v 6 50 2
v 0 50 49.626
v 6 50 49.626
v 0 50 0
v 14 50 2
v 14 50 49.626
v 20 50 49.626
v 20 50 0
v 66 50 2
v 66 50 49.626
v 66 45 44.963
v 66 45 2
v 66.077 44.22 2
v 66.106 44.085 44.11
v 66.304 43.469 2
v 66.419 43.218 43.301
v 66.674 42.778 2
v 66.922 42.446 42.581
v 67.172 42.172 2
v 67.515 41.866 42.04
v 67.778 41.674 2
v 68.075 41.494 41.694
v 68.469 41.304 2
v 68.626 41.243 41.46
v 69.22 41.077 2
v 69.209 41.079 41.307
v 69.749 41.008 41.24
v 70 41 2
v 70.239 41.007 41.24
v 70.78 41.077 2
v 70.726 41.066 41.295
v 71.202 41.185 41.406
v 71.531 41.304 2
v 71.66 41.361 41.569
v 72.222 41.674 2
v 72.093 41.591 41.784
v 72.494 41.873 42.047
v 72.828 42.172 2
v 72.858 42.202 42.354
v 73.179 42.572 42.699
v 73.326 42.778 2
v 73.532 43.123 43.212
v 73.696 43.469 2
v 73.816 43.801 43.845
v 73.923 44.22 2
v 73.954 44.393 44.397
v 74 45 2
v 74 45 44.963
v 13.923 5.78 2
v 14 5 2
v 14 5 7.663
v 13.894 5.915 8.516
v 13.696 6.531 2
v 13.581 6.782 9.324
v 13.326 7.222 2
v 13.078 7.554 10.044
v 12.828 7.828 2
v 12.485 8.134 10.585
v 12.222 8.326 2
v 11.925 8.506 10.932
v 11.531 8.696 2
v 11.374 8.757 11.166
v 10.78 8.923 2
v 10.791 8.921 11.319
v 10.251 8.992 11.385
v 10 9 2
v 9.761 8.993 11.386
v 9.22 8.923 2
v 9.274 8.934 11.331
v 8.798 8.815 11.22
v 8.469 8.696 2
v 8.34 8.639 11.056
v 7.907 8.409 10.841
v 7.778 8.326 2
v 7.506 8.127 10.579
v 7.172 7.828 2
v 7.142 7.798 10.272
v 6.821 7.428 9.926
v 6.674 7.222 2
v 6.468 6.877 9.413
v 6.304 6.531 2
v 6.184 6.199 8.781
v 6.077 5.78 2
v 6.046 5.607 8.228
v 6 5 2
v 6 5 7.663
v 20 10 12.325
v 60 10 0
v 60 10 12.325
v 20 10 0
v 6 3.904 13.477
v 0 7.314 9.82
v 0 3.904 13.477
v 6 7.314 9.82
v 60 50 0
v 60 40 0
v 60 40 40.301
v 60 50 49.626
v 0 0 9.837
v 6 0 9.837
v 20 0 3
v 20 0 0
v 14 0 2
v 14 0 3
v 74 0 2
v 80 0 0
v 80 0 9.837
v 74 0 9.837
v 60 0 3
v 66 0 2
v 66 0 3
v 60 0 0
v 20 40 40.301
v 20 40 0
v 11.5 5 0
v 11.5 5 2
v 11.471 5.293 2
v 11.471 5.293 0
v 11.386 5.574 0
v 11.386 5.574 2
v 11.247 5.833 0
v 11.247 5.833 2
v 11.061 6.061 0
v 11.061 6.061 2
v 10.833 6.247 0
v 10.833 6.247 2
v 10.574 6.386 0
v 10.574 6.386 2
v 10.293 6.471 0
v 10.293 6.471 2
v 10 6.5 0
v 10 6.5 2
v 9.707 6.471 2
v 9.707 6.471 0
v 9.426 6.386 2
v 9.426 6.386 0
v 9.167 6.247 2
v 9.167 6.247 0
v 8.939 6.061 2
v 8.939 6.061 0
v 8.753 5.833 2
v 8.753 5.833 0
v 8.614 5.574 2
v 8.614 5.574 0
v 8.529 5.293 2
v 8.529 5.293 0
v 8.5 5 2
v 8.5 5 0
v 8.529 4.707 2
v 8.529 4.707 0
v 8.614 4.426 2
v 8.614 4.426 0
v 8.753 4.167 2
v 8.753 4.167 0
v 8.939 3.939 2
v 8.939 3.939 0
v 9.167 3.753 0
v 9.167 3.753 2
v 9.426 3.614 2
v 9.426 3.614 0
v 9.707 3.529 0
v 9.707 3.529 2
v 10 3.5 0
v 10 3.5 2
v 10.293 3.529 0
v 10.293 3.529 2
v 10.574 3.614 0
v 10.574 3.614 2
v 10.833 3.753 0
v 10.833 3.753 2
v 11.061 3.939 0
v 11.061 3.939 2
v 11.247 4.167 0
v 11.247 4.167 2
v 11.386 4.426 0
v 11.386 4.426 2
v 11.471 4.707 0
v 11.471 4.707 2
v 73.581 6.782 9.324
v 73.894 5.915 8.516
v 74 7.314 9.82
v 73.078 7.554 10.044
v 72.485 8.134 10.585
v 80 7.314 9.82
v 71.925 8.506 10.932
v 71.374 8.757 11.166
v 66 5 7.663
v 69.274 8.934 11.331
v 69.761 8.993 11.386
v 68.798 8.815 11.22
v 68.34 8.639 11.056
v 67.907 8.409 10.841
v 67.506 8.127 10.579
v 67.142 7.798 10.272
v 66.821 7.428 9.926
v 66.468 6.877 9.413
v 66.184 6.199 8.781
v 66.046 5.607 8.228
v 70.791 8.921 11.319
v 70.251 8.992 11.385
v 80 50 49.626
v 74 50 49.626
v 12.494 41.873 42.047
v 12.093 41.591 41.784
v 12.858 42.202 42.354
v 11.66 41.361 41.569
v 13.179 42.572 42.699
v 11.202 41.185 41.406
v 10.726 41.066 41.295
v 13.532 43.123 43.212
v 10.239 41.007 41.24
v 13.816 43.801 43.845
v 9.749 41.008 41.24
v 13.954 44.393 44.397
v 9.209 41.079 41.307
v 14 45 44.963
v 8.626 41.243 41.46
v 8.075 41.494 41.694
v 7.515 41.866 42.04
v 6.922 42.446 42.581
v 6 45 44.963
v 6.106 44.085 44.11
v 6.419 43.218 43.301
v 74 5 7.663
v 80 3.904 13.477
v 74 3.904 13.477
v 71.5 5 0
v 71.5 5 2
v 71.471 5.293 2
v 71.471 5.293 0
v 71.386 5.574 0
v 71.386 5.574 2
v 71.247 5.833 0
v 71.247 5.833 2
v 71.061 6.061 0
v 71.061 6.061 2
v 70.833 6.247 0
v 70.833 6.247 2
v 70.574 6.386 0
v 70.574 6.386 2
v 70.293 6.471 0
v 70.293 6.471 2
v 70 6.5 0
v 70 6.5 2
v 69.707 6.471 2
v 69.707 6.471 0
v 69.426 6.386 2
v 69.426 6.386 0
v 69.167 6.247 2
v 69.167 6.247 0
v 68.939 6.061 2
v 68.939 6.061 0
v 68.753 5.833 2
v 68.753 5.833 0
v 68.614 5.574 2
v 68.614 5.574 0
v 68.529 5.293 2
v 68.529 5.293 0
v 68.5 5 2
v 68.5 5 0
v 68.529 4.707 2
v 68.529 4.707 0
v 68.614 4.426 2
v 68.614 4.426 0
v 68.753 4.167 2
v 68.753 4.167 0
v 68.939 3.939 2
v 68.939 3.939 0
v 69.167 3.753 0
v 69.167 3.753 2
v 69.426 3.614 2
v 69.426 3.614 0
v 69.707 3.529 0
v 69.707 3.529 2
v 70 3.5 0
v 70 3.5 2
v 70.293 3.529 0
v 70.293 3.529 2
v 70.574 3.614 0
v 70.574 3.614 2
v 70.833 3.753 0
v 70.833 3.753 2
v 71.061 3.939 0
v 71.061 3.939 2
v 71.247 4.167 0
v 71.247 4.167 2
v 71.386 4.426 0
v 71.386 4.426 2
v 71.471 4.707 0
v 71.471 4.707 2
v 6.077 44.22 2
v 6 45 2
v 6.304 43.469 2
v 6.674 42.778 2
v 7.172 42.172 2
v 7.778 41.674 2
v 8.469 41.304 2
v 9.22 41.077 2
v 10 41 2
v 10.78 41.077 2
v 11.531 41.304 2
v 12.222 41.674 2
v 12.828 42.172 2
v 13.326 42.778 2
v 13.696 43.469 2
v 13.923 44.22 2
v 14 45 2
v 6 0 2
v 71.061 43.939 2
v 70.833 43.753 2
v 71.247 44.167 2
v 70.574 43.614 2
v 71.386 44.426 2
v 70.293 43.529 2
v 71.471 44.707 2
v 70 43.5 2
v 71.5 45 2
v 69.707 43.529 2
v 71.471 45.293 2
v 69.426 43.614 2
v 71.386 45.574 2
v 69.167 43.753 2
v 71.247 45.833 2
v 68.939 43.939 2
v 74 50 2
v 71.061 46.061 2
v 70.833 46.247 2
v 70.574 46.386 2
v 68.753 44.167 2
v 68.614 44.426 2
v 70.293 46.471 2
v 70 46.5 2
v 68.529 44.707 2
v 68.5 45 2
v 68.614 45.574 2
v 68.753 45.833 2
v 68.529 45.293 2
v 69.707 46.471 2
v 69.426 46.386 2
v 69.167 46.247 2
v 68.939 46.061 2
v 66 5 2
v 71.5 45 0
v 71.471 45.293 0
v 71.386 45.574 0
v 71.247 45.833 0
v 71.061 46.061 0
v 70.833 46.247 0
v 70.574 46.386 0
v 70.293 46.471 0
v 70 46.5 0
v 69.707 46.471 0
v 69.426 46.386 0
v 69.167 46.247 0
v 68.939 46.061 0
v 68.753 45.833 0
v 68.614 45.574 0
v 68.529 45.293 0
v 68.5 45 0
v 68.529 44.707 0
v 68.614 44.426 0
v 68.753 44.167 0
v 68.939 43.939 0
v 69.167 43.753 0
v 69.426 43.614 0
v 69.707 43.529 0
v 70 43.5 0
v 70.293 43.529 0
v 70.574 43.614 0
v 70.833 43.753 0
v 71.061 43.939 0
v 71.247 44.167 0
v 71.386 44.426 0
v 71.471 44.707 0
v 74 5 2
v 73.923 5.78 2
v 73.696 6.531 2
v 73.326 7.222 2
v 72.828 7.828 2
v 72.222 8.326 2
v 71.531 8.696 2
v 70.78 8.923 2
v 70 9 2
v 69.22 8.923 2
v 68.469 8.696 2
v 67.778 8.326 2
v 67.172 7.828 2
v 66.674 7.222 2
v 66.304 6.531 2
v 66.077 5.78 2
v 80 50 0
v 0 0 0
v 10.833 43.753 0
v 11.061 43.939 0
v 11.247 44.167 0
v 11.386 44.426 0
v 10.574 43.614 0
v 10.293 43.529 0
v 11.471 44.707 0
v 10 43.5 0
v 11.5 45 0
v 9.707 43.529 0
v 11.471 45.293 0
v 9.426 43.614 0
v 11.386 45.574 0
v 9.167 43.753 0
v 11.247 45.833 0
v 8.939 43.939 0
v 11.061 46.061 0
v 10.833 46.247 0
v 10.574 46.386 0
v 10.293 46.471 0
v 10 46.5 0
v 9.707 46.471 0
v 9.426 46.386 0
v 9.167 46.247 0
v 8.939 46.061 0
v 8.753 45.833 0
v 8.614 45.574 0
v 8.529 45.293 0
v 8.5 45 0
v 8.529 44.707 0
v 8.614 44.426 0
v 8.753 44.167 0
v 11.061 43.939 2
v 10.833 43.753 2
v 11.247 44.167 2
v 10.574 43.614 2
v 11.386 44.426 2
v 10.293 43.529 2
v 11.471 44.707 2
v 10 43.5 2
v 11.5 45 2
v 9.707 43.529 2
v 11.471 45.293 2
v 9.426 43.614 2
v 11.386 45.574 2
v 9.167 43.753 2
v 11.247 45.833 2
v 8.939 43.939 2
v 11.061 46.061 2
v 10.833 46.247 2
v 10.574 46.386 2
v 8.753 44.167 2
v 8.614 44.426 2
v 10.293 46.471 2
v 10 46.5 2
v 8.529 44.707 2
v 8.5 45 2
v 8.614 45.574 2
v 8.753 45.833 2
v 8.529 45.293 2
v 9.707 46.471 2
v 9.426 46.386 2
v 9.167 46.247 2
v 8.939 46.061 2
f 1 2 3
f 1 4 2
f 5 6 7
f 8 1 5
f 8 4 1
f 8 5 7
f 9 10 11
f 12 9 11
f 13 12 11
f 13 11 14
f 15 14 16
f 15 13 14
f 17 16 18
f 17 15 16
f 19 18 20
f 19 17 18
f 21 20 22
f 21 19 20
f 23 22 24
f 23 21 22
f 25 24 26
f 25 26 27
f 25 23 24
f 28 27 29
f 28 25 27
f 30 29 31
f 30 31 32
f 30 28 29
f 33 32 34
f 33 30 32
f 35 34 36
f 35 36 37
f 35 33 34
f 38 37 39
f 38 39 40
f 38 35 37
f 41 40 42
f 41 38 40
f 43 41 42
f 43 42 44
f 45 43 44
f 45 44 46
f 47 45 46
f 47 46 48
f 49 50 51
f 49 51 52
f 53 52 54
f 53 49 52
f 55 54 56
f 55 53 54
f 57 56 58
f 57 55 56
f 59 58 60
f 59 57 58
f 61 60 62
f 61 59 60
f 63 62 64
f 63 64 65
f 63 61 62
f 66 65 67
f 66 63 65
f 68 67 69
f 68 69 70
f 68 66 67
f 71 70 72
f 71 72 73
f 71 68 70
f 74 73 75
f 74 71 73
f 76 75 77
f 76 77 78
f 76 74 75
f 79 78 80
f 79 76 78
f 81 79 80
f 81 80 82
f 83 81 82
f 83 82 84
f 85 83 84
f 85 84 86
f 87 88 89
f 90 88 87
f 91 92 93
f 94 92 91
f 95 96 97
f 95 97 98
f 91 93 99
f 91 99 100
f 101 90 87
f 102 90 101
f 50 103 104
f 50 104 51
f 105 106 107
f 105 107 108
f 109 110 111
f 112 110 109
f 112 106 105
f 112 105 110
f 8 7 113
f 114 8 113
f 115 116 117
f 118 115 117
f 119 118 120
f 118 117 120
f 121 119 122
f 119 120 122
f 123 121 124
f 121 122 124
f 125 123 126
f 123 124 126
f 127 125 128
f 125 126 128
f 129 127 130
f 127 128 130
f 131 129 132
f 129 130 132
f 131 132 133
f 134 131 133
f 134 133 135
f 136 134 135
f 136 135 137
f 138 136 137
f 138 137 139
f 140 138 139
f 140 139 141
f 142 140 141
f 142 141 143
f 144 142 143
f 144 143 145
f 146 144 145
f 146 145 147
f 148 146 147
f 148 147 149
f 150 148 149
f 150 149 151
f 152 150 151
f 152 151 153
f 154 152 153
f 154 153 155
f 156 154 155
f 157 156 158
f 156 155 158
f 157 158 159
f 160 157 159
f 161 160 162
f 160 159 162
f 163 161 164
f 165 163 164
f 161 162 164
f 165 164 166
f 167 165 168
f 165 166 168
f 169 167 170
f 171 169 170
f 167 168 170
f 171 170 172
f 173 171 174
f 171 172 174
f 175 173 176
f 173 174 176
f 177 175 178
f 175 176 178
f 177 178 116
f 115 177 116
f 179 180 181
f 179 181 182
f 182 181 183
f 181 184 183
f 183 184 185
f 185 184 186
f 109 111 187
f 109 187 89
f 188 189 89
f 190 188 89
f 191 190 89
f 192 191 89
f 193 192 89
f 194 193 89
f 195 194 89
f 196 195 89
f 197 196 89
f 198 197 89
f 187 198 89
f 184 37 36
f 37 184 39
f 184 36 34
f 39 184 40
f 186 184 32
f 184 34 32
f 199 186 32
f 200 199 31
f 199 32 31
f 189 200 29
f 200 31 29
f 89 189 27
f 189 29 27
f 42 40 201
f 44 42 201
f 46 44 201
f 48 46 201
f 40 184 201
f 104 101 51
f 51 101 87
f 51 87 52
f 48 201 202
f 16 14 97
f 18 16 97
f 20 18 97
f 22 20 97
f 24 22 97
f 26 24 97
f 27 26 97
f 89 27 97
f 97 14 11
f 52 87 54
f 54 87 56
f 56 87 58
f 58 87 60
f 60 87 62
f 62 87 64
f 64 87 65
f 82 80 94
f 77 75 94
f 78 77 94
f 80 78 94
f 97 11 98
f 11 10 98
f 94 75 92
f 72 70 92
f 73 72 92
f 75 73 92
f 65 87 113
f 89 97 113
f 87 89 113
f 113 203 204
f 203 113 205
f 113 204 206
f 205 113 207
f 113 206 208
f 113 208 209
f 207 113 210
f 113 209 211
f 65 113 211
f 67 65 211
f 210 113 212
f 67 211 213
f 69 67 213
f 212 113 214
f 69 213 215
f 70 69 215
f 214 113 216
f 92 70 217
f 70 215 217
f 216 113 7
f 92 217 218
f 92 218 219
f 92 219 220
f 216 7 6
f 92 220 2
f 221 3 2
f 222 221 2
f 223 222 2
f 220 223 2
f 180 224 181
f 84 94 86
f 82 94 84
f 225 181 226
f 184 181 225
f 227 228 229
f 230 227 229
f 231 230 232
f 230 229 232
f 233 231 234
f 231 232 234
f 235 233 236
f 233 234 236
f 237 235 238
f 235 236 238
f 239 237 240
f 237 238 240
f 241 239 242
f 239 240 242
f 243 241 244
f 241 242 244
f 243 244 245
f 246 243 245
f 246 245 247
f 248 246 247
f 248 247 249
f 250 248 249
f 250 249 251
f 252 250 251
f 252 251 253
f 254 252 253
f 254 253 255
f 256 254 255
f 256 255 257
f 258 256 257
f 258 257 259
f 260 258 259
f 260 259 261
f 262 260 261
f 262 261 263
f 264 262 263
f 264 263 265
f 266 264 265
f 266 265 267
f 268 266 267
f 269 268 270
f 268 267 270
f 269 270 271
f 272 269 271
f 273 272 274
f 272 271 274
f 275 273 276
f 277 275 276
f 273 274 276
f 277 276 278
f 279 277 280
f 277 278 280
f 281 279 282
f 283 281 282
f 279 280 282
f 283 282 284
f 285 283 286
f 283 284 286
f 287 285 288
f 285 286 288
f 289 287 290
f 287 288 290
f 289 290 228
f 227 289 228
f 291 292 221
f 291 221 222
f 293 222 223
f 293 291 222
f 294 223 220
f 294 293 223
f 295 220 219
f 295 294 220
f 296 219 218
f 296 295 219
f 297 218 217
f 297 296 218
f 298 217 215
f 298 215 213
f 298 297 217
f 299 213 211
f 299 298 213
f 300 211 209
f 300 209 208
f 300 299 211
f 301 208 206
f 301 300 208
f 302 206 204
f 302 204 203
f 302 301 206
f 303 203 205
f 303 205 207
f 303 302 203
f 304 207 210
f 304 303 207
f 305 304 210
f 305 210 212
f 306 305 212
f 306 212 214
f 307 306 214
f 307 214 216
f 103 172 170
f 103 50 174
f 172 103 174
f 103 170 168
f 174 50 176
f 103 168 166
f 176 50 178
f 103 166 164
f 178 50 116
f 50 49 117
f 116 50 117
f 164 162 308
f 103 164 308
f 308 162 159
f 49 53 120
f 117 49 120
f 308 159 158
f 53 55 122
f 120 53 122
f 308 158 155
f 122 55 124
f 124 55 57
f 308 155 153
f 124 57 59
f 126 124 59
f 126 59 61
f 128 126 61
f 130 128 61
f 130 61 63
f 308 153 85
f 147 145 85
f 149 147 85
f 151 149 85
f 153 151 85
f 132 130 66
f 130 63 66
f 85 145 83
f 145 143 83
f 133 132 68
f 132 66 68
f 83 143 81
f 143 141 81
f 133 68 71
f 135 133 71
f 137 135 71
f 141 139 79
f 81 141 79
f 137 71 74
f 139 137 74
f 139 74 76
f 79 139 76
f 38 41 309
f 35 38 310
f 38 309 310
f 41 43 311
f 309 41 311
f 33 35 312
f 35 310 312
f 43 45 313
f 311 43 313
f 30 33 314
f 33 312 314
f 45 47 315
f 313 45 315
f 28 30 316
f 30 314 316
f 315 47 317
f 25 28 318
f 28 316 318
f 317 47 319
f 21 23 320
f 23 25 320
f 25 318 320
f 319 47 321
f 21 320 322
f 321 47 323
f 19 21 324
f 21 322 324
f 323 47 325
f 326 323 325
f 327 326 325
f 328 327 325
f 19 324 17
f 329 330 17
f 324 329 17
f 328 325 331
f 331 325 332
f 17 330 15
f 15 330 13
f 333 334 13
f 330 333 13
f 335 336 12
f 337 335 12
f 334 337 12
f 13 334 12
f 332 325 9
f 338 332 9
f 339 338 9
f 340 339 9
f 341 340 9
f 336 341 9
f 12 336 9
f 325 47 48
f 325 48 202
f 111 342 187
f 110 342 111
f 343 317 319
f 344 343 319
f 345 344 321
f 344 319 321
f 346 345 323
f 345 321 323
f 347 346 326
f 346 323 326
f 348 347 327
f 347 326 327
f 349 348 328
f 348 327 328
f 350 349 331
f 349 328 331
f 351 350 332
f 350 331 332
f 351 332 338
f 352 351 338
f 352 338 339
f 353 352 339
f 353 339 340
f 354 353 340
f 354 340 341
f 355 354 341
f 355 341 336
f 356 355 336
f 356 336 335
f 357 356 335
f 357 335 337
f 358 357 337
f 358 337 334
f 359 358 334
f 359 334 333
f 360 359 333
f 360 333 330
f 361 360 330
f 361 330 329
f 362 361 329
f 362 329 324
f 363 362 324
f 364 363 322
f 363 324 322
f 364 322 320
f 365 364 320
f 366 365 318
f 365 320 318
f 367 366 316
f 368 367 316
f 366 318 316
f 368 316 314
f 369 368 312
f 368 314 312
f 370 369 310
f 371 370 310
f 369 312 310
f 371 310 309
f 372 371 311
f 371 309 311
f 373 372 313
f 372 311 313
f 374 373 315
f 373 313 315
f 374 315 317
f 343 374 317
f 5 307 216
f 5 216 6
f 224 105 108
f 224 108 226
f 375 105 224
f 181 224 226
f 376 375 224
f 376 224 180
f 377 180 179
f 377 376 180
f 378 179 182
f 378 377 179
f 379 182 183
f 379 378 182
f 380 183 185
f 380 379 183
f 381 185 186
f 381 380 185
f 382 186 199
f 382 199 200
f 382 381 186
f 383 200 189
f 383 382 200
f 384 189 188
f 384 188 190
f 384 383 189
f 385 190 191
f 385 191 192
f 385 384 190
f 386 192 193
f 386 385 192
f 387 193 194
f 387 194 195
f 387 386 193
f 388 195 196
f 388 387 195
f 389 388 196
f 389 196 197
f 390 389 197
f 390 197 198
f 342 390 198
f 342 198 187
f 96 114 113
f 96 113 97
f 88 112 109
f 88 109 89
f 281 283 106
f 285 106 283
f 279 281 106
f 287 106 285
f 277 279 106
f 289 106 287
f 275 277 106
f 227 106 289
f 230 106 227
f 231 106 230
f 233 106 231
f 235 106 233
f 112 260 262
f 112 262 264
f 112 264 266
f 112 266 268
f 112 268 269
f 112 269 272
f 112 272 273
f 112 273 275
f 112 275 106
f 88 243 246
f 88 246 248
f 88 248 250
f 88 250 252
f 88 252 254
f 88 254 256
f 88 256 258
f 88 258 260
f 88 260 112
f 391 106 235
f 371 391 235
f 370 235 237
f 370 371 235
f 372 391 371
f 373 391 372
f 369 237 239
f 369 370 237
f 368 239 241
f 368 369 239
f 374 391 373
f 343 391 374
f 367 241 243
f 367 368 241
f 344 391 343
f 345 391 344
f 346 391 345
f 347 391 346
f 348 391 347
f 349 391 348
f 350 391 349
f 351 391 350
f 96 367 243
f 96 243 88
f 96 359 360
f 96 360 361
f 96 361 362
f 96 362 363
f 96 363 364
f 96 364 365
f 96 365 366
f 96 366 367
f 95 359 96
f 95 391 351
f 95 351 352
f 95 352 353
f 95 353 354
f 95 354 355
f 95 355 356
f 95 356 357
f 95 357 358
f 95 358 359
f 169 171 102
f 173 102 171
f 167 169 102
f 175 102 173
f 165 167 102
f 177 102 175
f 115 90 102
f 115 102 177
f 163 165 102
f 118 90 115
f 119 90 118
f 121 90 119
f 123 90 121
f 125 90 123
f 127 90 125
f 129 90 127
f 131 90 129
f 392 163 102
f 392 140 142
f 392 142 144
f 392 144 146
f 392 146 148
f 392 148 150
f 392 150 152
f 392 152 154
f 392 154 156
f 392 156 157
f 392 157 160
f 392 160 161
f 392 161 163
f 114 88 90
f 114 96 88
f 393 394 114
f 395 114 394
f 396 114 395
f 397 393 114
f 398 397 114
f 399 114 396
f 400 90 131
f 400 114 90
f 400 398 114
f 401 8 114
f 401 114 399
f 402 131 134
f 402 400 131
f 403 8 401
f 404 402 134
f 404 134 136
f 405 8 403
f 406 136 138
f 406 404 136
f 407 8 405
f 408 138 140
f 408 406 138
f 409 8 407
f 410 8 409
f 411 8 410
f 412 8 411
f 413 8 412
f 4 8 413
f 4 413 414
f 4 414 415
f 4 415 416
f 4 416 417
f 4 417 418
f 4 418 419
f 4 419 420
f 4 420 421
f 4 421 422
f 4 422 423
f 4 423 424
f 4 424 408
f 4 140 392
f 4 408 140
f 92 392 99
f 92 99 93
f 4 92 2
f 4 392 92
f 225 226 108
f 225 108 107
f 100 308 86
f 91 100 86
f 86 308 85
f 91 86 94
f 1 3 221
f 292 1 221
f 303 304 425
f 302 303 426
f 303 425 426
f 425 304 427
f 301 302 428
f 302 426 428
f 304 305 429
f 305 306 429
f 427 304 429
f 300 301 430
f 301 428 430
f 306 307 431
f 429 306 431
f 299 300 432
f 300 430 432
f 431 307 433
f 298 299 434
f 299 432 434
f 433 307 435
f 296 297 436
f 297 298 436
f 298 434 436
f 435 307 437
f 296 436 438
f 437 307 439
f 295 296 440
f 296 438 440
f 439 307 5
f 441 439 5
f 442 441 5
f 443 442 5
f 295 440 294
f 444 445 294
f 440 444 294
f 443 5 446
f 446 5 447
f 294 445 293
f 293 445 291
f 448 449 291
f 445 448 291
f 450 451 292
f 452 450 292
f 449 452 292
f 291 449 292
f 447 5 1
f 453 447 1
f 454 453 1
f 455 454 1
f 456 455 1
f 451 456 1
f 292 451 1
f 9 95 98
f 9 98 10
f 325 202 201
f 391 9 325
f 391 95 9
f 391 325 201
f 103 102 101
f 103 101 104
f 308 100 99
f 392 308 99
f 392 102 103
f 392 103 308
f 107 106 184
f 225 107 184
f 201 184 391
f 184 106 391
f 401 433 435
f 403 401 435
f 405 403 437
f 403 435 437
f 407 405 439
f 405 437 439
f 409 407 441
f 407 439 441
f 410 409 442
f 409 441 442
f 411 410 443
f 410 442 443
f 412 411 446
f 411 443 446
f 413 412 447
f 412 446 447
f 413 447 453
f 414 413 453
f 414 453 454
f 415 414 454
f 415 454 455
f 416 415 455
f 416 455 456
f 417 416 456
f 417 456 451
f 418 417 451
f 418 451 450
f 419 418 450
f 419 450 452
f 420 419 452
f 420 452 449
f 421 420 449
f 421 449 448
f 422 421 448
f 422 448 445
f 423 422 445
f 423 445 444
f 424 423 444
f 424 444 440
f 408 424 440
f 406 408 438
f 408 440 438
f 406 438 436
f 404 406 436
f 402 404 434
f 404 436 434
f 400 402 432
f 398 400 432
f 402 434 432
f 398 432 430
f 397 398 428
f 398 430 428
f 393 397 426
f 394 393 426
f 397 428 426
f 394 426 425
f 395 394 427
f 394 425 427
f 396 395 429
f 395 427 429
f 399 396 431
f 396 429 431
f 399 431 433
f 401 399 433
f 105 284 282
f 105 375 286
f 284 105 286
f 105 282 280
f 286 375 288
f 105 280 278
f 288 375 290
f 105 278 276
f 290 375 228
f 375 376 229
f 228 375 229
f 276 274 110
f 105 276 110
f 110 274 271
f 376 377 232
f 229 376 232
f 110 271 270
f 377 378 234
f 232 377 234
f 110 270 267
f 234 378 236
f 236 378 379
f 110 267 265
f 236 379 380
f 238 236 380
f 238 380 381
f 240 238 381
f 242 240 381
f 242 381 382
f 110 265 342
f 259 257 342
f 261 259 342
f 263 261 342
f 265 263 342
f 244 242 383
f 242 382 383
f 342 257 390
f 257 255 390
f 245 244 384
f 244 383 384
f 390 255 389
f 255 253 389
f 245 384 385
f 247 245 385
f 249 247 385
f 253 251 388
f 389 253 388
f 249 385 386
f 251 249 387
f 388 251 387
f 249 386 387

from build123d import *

# Parameters (mm, degrees)
EXTRUDE_2_DEPTH     = 2
SKETCH_3_R          = 1.5
CUT_EXTRUDE_1_DEPTH = 95.361008897
EXTRUDE_3_DEPTH     = 1
DRAFT_4_ANGLE       = 43
SKETCH_6_W          = 6
SKETCH_6_H          = 10
EXTRUDE_4_DEPTH     = 5
SKETCH_7_W          = 6
SKETCH_7_H          = 10
EXTRUDE_5_DEPTH     = 5
CUT_EXTRUDE_2_DEPTH = 107.596038813


with BuildPart() as part:
    # 草图1 → 凸台-拉伸2 (new body)
    with BuildSketch(Plane.XY):
        Polygon((0, 0), (0, 50), (20, 50), (20, 40), (60, 40), (60, 50), (80, 50), (80, 0), (60, 0), (60, 10), (20, 10), (20, 0), align=None)
    extrude(amount=EXTRUDE_2_DEPTH)

    # 草图3 → 切除-拉伸1 (cut, through all)
    with BuildSketch(Plane.XY.offset(2)):
        with Locations((10, 45)):
            Circle(SKETCH_3_R)
        with Locations((10, 5)):
            Circle(SKETCH_3_R)
        with Locations((70, 45)):
            Circle(SKETCH_3_R)
        with Locations((70, 5)):
            Circle(SKETCH_3_R)
    extrude(amount=-CUT_EXTRUDE_1_DEPTH, mode=Mode.SUBTRACT)

    # 草图5 → 凸台-拉伸3 (add)
    with BuildSketch(Plane.XY.offset(2)):
        with BuildLine():
            Line((0, 50), (6, 50))
            Line((6, 50), (6, 45))
            ThreePointArc((6, 45), (10, 41), (14, 45))
            Line((14, 45), (14, 50))
            Line((14, 50), (20, 50))
            Line((20, 50), (20, 40))
            Line((20, 40), (60, 40))
            Line((60, 40), (60, 50))
            Line((60, 50), (66, 50))
            Line((66, 50), (66, 45))
            ThreePointArc((66, 45), (70, 41), (74, 45))
            Line((74, 45), (74, 50))
            Line((74, 50), (80, 50))
            Line((80, 50), (80, 0))
            Line((80, 0), (74, 0))
            Line((74, 0), (74, 5))
            ThreePointArc((74, 5), (70, 9), (66, 5))
            Line((66, 5), (66, 0))
            Line((66, 0), (60, 0))
            Line((60, 0), (60, 10))
            Line((60, 10), (20, 10))
            Line((20, 10), (20, 0))
            Line((20, 0), (14, 0))
            Line((14, 0), (14, 5))
            ThreePointArc((14, 5), (10, 9), (6, 5))
            Line((6, 5), (6, 0))
            Line((6, 0), (0, 0))
            Line((0, 0), (0, 50))
        make_face()
    extrude(amount=EXTRUDE_3_DEPTH)

    # 拔模4
    draft_4_faces = [part.faces().sort_by_distance(p)[0] for p in [
        (40, 25, 3),
    ]]
    draft(draft_4_faces, Plane(origin=(20, 0, 2), x_dir=(-1, 0, 0), z_dir=(0, -1, 0)), DRAFT_4_ANGLE)

    # 草图6 → 凸台-拉伸4 (add)
    with BuildSketch(Plane(origin=(0, -1.496346075, 1.604634711), x_dir=(1, 0, 0), z_dir=(0, -0.6819983600624997, 0.7313537016191695))):
        with Locations((3, 7.04599508)):
            Rectangle(SKETCH_6_W, SKETCH_6_H)
    extrude(amount=EXTRUDE_4_DEPTH)

    # 草图7 → 凸台-拉伸5 (add)
    with BuildSketch(Plane(origin=(0, -1.496346075, 1.604634711), x_dir=(1, 0, 0), z_dir=(0, -0.6819983600624997, 0.7313537016191695))):
        with Locations((77, 7.04599508)):
            Rectangle(SKETCH_7_W, SKETCH_7_H)
    extrude(amount=EXTRUDE_5_DEPTH)

    # 草图8 → 切除-拉伸2 (cut, through all)
    with BuildSketch(Plane(origin=(80, 0, 0), x_dir=(0, 0, -1), z_dir=(1, 0, 0))):
        Polygon((-3, 0), (-9.836637305, 0), (-6.656768508, -3.4099918), align=None)
    extrude(amount=-CUT_EXTRUDE_2_DEPTH, mode=Mode.SUBTRACT)


solid = part.part
